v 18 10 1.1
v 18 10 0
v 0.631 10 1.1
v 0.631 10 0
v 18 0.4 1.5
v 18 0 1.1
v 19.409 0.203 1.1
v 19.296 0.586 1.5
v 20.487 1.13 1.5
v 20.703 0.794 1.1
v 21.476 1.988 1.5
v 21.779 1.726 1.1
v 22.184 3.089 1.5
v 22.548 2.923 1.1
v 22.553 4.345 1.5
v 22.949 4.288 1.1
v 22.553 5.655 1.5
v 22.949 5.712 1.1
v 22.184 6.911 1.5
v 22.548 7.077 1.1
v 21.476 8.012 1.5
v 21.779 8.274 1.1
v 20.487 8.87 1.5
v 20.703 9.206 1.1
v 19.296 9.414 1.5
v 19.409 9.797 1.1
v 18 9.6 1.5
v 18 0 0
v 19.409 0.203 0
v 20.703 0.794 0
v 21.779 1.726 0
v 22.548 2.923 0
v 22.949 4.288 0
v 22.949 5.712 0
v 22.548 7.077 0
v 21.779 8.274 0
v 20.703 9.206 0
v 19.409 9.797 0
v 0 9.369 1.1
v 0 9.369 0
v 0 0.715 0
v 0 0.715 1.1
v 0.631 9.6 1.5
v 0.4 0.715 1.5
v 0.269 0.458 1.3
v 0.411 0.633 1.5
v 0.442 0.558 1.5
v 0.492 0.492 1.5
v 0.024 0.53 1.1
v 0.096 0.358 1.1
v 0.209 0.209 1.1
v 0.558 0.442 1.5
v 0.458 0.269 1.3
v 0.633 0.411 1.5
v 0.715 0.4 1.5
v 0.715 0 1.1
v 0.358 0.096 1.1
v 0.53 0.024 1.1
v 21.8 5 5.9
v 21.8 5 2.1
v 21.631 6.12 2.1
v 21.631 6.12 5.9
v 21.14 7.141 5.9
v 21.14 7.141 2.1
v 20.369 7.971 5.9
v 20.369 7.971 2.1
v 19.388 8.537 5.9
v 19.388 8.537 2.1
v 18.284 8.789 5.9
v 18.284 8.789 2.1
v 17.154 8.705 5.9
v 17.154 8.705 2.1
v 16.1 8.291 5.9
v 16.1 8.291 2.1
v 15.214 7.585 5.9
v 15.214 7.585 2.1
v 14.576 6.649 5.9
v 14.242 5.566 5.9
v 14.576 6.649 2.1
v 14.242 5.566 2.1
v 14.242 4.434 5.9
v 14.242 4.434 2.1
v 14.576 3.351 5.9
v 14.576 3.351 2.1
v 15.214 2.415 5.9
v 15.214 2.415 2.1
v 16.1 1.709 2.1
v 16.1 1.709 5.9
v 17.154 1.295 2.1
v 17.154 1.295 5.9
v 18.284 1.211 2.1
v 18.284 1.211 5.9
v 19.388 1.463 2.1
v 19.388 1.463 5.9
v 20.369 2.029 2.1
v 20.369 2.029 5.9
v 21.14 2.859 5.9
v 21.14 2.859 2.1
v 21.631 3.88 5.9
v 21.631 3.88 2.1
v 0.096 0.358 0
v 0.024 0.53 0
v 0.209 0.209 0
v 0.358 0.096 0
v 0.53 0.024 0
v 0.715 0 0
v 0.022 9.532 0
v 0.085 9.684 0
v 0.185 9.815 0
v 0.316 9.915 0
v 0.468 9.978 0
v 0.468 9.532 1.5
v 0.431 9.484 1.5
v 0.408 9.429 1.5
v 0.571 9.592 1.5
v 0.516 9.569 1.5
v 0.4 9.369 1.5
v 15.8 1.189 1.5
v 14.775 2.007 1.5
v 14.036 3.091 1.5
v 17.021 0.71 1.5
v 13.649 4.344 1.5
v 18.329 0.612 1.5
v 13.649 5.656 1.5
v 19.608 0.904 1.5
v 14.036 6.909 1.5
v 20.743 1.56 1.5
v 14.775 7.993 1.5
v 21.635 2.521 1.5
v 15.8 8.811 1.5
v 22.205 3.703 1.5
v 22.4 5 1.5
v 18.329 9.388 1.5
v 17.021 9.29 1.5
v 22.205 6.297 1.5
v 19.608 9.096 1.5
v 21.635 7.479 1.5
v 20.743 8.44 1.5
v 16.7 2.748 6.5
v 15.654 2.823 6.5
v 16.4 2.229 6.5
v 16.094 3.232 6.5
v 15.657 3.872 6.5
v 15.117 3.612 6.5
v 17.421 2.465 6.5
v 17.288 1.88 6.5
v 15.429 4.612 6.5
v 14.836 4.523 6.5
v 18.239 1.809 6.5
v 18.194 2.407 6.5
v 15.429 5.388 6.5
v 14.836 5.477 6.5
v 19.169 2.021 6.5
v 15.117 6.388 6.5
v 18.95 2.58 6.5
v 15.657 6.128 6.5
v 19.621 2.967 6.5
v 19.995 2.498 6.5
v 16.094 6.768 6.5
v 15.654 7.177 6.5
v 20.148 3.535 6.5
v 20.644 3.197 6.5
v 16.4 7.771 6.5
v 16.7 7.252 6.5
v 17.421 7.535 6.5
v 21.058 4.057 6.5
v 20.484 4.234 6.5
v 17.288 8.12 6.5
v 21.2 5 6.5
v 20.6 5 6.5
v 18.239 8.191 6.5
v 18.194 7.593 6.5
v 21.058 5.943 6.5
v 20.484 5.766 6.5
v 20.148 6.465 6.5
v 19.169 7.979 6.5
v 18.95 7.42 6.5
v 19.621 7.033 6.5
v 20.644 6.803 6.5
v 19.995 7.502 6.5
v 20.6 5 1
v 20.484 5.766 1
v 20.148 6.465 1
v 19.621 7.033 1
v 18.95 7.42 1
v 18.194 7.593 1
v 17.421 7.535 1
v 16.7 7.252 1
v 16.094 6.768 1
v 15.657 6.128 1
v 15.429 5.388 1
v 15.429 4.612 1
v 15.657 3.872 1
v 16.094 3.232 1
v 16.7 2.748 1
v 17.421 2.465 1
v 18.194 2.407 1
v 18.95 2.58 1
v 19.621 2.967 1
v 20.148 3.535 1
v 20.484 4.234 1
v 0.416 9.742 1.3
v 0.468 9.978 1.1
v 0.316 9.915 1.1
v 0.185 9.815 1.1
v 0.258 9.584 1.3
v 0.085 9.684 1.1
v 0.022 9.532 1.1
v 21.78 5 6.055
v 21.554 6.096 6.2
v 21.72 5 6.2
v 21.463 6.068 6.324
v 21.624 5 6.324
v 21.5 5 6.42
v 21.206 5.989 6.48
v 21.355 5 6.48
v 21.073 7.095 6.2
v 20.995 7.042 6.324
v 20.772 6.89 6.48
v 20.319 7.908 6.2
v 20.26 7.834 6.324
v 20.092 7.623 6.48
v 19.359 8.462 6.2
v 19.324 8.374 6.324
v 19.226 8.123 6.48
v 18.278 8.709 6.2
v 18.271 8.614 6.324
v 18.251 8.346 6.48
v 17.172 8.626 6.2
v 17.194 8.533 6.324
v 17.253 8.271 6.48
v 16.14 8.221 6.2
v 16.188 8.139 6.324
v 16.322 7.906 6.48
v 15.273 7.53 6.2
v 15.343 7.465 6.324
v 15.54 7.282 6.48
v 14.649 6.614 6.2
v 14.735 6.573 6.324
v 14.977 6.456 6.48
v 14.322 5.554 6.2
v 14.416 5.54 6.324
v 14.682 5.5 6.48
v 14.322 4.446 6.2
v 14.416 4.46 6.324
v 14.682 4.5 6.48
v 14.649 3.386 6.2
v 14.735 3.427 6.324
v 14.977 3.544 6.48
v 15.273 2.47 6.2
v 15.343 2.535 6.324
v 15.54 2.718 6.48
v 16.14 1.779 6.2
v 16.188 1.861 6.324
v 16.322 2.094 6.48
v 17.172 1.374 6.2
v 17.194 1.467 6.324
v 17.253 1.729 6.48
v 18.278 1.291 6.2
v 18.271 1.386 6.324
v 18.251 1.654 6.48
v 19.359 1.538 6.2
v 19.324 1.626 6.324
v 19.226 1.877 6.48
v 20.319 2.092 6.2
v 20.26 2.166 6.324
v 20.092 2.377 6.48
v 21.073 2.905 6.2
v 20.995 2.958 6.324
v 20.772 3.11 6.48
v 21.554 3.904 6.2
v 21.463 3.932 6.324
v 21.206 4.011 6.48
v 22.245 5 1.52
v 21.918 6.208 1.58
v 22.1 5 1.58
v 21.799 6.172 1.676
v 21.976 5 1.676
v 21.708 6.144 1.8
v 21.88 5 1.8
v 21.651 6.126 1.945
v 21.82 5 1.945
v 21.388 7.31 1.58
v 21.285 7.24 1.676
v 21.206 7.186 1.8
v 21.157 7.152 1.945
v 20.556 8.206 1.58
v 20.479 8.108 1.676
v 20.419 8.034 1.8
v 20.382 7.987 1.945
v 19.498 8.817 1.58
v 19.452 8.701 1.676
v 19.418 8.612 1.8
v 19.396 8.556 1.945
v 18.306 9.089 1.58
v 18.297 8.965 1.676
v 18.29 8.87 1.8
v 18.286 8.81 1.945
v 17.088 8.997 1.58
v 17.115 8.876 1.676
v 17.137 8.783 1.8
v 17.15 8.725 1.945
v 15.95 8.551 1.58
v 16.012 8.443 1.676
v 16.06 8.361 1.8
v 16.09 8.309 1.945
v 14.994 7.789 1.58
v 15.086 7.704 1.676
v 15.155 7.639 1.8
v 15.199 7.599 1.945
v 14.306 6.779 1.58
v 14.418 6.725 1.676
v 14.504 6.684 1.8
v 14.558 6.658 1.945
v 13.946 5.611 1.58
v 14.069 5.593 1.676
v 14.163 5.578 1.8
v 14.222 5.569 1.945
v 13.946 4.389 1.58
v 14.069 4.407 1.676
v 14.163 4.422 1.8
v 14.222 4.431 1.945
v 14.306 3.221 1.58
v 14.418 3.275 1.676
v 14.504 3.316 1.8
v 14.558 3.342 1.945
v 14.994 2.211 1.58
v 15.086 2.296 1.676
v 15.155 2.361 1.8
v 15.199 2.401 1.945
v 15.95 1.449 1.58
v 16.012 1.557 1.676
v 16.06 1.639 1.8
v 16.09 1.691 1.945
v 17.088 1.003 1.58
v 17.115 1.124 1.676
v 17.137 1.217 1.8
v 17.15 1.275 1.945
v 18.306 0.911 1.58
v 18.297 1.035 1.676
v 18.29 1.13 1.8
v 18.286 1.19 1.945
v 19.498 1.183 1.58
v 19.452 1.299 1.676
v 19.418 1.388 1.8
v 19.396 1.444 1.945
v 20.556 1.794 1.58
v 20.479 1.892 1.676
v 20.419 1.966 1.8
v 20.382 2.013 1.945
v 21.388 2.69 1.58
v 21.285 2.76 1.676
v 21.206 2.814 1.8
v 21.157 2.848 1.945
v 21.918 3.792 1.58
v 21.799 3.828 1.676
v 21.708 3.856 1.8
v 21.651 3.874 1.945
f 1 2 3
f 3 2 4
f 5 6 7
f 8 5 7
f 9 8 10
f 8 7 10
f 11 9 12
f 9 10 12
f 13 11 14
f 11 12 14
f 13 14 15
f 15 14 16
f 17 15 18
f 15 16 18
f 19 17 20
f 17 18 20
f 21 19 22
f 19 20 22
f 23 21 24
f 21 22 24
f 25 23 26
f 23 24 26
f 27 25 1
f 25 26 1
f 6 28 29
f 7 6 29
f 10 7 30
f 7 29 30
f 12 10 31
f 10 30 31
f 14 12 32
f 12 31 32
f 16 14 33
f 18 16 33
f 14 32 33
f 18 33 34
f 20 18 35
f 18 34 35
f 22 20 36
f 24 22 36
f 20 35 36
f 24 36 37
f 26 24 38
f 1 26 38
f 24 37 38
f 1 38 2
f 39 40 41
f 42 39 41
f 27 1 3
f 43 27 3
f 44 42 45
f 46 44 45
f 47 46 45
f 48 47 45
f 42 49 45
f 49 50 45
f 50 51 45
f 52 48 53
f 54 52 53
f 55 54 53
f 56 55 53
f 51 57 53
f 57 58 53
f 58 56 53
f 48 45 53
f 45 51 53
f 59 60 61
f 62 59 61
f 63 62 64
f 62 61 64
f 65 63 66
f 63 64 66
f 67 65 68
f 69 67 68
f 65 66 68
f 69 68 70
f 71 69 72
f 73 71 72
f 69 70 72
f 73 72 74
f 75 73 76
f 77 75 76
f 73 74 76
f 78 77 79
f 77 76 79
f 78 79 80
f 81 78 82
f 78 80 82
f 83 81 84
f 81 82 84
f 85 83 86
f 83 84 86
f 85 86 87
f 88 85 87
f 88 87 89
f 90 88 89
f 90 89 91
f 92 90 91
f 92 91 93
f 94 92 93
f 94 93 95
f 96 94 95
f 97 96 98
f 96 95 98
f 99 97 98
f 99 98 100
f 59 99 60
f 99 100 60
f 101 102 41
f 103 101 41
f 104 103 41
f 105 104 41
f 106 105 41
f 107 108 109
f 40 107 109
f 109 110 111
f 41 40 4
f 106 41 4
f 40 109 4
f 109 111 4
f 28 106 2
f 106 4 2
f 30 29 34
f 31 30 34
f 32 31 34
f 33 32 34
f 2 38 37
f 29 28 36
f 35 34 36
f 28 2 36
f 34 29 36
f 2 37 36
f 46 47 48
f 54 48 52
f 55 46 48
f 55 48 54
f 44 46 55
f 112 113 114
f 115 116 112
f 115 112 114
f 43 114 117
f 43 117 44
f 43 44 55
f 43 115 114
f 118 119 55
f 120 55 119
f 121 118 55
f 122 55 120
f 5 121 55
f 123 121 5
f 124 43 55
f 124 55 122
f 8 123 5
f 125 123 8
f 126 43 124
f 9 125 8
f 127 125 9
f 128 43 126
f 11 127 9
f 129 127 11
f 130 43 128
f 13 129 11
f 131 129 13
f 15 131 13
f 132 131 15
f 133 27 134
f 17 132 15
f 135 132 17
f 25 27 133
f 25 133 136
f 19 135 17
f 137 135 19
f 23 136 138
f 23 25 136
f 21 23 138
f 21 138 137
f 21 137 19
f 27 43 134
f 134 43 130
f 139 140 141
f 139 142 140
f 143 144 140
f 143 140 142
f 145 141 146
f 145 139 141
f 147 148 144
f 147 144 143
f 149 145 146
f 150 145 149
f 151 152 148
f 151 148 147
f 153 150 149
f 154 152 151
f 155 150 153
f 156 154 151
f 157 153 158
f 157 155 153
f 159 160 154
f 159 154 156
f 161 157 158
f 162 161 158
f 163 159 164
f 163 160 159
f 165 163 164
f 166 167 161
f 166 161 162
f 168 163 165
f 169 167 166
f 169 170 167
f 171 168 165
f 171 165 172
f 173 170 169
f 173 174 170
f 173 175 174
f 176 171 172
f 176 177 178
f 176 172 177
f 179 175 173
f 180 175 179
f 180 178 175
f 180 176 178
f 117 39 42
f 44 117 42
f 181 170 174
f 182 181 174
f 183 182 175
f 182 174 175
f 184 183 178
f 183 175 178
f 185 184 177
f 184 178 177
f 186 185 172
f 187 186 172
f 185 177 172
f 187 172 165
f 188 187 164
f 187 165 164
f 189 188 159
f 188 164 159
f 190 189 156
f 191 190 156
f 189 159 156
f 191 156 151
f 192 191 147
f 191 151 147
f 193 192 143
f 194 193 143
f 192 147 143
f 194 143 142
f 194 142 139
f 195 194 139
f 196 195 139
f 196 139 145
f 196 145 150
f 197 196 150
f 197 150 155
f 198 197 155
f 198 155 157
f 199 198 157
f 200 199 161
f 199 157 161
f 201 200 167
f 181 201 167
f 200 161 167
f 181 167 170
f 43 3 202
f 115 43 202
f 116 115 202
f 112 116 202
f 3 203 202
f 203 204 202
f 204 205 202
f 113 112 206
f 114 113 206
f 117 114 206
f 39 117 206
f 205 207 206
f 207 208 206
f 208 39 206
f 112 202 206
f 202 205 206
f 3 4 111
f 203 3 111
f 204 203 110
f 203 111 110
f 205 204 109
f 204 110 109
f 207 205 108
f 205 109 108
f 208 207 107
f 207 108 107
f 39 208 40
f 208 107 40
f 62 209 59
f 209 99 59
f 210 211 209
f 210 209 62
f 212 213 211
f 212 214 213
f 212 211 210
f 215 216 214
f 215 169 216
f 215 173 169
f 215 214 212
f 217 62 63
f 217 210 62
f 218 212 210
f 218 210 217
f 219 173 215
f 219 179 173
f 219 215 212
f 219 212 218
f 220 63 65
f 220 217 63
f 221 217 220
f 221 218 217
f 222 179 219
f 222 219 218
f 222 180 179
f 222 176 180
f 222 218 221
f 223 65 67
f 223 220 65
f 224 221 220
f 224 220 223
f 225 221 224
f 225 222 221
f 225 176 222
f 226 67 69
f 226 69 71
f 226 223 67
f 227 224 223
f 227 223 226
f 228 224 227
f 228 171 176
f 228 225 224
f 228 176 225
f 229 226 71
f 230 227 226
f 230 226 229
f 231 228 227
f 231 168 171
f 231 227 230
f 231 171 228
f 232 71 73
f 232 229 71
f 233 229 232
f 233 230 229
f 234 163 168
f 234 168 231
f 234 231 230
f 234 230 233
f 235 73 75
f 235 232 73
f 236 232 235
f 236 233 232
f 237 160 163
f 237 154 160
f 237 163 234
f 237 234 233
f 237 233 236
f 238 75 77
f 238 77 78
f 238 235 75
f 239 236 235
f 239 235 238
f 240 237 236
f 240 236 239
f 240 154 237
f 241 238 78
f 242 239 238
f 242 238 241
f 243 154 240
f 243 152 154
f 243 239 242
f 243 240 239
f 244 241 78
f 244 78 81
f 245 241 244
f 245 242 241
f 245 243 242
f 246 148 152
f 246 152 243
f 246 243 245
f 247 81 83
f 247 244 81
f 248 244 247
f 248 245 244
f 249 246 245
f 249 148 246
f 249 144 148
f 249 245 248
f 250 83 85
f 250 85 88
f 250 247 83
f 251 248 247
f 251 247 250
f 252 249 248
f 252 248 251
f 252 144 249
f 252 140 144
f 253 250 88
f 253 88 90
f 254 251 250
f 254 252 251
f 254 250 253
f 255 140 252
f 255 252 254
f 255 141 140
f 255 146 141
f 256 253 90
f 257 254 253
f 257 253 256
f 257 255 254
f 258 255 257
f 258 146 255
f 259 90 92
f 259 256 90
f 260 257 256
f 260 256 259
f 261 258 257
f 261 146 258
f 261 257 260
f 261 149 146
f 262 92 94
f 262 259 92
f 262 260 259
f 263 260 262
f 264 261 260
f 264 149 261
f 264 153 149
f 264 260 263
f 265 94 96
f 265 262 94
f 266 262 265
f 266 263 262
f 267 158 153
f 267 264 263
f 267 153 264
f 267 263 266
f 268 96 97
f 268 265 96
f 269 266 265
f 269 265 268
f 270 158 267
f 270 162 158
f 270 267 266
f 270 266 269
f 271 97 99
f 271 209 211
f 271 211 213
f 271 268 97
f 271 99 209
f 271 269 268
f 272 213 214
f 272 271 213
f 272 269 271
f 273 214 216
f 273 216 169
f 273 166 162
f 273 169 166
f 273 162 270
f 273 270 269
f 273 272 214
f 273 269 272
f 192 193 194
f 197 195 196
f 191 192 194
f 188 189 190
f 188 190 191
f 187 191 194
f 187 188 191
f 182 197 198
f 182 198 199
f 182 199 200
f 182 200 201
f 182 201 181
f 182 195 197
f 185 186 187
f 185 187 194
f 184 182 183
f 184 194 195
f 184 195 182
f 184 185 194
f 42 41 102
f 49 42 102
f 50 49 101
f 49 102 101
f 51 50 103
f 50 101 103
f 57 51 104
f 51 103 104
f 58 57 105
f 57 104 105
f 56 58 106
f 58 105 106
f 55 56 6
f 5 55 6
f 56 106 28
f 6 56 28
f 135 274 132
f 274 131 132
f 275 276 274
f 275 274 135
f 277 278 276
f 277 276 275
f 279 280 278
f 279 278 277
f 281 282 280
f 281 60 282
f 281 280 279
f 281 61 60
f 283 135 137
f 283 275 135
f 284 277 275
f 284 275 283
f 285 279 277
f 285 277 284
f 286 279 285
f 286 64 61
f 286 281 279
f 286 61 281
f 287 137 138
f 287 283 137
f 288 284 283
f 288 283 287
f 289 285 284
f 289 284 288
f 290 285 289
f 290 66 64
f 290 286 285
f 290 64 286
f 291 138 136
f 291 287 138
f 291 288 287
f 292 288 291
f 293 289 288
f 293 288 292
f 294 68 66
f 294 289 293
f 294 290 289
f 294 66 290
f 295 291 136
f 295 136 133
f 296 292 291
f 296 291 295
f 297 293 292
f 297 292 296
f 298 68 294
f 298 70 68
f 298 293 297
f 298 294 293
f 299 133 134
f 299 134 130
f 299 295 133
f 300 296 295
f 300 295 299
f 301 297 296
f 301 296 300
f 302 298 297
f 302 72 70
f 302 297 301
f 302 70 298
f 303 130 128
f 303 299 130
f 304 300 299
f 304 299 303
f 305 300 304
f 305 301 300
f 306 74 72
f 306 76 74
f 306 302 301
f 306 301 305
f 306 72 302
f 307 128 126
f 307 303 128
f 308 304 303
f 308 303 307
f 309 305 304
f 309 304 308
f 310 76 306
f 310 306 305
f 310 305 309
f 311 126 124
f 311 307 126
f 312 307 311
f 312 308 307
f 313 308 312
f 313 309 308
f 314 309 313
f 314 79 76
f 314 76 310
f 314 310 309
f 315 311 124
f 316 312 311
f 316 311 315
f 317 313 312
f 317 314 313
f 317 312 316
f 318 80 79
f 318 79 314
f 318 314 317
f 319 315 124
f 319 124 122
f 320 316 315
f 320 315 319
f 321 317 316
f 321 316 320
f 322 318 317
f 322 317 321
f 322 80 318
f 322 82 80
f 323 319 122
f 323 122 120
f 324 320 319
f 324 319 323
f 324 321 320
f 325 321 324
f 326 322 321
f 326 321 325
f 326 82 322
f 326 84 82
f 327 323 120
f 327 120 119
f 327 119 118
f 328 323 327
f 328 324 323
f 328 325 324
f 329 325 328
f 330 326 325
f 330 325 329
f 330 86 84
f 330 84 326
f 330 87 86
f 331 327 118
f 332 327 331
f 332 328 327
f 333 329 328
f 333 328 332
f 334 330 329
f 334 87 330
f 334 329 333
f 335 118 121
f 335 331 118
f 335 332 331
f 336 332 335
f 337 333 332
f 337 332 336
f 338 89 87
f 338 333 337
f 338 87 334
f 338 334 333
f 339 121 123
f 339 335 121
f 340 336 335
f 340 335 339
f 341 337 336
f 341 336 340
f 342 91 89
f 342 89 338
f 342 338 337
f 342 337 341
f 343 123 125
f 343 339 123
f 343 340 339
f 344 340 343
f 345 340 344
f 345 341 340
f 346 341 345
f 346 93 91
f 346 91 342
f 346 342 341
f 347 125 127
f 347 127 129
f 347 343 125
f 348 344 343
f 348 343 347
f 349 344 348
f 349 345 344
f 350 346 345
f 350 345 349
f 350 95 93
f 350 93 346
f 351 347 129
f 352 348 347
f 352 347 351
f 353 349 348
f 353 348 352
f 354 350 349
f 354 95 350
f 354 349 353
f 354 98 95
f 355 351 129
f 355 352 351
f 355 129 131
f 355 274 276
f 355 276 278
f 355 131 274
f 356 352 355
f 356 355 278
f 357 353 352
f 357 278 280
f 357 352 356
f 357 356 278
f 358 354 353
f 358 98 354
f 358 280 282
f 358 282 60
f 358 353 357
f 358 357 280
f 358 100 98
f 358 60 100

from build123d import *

# Parameters (mm, degrees)
PAD_DEPTH    = 1.5
SKETCH001_R  = 3.8
PAD001_DEPTH = 5
SKETCH002_R  = 2.6
POCKET_DEPTH = 5.5
FILLET_R     = 0.6
CHAMFER_SIZE = 0.4


with BuildPart() as part:
    # Sketch → Pad (new body)
    with BuildSketch(Plane.XY):
        with BuildLine():
            Line((0.715008, 0), (18, 0))
            ThreePointArc((18, 0), (23.000017, 5), (18, 10))
            Line((18, 10), (0.631198, 10))
            ThreePointArc((0.631198, 10), (0.184874, 9.815126), (0, 9.368802))
            Line((0, 9.368802), (0, 0.715008))
            ThreePointArc((0, 0.715008), (0.209421, 0.209421), (0.715008, 0))
        make_face()
    extrude(amount=PAD_DEPTH)

    # Sketch001 (on Face8 of Pad) → Pad001 (join)
    with BuildSketch(Plane.XY.offset(1.5)):
        with Locations((18, 5)):
            Circle(SKETCH001_R)
    extrude(amount=PAD001_DEPTH)

    # Sketch002 → Pocket (cut)
    with BuildSketch(Plane.XY.offset(6.5)):
        with Locations((18, 5)):
            Circle(SKETCH002_R)
    extrude(amount=-POCKET_DEPTH, mode=Mode.SUBTRACT)

    # Fillet
    fillet_edges = [part.edges().sort_by_distance(p)[0] for p in [
        (21.8, 5, 4),
        (14.2, 5, 1.5),
        (14.2, 5, 6.5),
    ]]
    fillet(fillet_edges, radius=FILLET_R)

    # Chamfer
    chamfer_edges = [part.edges().sort_by_distance(p)[0] for p in [
        (13.6, 5, 1.5),
        (9.357504, 0, 1.5),
        (0.209421, 0.209421, 1.5),
        (23.000017, 5, 1.5),
        (0, 5.041905, 1.5),
        (9.315599, 10, 1.5),
        (0.184874, 9.815126, 1.5),
    ]]
    chamfer(chamfer_edges, length=CHAMFER_SIZE)


solid = part.part
